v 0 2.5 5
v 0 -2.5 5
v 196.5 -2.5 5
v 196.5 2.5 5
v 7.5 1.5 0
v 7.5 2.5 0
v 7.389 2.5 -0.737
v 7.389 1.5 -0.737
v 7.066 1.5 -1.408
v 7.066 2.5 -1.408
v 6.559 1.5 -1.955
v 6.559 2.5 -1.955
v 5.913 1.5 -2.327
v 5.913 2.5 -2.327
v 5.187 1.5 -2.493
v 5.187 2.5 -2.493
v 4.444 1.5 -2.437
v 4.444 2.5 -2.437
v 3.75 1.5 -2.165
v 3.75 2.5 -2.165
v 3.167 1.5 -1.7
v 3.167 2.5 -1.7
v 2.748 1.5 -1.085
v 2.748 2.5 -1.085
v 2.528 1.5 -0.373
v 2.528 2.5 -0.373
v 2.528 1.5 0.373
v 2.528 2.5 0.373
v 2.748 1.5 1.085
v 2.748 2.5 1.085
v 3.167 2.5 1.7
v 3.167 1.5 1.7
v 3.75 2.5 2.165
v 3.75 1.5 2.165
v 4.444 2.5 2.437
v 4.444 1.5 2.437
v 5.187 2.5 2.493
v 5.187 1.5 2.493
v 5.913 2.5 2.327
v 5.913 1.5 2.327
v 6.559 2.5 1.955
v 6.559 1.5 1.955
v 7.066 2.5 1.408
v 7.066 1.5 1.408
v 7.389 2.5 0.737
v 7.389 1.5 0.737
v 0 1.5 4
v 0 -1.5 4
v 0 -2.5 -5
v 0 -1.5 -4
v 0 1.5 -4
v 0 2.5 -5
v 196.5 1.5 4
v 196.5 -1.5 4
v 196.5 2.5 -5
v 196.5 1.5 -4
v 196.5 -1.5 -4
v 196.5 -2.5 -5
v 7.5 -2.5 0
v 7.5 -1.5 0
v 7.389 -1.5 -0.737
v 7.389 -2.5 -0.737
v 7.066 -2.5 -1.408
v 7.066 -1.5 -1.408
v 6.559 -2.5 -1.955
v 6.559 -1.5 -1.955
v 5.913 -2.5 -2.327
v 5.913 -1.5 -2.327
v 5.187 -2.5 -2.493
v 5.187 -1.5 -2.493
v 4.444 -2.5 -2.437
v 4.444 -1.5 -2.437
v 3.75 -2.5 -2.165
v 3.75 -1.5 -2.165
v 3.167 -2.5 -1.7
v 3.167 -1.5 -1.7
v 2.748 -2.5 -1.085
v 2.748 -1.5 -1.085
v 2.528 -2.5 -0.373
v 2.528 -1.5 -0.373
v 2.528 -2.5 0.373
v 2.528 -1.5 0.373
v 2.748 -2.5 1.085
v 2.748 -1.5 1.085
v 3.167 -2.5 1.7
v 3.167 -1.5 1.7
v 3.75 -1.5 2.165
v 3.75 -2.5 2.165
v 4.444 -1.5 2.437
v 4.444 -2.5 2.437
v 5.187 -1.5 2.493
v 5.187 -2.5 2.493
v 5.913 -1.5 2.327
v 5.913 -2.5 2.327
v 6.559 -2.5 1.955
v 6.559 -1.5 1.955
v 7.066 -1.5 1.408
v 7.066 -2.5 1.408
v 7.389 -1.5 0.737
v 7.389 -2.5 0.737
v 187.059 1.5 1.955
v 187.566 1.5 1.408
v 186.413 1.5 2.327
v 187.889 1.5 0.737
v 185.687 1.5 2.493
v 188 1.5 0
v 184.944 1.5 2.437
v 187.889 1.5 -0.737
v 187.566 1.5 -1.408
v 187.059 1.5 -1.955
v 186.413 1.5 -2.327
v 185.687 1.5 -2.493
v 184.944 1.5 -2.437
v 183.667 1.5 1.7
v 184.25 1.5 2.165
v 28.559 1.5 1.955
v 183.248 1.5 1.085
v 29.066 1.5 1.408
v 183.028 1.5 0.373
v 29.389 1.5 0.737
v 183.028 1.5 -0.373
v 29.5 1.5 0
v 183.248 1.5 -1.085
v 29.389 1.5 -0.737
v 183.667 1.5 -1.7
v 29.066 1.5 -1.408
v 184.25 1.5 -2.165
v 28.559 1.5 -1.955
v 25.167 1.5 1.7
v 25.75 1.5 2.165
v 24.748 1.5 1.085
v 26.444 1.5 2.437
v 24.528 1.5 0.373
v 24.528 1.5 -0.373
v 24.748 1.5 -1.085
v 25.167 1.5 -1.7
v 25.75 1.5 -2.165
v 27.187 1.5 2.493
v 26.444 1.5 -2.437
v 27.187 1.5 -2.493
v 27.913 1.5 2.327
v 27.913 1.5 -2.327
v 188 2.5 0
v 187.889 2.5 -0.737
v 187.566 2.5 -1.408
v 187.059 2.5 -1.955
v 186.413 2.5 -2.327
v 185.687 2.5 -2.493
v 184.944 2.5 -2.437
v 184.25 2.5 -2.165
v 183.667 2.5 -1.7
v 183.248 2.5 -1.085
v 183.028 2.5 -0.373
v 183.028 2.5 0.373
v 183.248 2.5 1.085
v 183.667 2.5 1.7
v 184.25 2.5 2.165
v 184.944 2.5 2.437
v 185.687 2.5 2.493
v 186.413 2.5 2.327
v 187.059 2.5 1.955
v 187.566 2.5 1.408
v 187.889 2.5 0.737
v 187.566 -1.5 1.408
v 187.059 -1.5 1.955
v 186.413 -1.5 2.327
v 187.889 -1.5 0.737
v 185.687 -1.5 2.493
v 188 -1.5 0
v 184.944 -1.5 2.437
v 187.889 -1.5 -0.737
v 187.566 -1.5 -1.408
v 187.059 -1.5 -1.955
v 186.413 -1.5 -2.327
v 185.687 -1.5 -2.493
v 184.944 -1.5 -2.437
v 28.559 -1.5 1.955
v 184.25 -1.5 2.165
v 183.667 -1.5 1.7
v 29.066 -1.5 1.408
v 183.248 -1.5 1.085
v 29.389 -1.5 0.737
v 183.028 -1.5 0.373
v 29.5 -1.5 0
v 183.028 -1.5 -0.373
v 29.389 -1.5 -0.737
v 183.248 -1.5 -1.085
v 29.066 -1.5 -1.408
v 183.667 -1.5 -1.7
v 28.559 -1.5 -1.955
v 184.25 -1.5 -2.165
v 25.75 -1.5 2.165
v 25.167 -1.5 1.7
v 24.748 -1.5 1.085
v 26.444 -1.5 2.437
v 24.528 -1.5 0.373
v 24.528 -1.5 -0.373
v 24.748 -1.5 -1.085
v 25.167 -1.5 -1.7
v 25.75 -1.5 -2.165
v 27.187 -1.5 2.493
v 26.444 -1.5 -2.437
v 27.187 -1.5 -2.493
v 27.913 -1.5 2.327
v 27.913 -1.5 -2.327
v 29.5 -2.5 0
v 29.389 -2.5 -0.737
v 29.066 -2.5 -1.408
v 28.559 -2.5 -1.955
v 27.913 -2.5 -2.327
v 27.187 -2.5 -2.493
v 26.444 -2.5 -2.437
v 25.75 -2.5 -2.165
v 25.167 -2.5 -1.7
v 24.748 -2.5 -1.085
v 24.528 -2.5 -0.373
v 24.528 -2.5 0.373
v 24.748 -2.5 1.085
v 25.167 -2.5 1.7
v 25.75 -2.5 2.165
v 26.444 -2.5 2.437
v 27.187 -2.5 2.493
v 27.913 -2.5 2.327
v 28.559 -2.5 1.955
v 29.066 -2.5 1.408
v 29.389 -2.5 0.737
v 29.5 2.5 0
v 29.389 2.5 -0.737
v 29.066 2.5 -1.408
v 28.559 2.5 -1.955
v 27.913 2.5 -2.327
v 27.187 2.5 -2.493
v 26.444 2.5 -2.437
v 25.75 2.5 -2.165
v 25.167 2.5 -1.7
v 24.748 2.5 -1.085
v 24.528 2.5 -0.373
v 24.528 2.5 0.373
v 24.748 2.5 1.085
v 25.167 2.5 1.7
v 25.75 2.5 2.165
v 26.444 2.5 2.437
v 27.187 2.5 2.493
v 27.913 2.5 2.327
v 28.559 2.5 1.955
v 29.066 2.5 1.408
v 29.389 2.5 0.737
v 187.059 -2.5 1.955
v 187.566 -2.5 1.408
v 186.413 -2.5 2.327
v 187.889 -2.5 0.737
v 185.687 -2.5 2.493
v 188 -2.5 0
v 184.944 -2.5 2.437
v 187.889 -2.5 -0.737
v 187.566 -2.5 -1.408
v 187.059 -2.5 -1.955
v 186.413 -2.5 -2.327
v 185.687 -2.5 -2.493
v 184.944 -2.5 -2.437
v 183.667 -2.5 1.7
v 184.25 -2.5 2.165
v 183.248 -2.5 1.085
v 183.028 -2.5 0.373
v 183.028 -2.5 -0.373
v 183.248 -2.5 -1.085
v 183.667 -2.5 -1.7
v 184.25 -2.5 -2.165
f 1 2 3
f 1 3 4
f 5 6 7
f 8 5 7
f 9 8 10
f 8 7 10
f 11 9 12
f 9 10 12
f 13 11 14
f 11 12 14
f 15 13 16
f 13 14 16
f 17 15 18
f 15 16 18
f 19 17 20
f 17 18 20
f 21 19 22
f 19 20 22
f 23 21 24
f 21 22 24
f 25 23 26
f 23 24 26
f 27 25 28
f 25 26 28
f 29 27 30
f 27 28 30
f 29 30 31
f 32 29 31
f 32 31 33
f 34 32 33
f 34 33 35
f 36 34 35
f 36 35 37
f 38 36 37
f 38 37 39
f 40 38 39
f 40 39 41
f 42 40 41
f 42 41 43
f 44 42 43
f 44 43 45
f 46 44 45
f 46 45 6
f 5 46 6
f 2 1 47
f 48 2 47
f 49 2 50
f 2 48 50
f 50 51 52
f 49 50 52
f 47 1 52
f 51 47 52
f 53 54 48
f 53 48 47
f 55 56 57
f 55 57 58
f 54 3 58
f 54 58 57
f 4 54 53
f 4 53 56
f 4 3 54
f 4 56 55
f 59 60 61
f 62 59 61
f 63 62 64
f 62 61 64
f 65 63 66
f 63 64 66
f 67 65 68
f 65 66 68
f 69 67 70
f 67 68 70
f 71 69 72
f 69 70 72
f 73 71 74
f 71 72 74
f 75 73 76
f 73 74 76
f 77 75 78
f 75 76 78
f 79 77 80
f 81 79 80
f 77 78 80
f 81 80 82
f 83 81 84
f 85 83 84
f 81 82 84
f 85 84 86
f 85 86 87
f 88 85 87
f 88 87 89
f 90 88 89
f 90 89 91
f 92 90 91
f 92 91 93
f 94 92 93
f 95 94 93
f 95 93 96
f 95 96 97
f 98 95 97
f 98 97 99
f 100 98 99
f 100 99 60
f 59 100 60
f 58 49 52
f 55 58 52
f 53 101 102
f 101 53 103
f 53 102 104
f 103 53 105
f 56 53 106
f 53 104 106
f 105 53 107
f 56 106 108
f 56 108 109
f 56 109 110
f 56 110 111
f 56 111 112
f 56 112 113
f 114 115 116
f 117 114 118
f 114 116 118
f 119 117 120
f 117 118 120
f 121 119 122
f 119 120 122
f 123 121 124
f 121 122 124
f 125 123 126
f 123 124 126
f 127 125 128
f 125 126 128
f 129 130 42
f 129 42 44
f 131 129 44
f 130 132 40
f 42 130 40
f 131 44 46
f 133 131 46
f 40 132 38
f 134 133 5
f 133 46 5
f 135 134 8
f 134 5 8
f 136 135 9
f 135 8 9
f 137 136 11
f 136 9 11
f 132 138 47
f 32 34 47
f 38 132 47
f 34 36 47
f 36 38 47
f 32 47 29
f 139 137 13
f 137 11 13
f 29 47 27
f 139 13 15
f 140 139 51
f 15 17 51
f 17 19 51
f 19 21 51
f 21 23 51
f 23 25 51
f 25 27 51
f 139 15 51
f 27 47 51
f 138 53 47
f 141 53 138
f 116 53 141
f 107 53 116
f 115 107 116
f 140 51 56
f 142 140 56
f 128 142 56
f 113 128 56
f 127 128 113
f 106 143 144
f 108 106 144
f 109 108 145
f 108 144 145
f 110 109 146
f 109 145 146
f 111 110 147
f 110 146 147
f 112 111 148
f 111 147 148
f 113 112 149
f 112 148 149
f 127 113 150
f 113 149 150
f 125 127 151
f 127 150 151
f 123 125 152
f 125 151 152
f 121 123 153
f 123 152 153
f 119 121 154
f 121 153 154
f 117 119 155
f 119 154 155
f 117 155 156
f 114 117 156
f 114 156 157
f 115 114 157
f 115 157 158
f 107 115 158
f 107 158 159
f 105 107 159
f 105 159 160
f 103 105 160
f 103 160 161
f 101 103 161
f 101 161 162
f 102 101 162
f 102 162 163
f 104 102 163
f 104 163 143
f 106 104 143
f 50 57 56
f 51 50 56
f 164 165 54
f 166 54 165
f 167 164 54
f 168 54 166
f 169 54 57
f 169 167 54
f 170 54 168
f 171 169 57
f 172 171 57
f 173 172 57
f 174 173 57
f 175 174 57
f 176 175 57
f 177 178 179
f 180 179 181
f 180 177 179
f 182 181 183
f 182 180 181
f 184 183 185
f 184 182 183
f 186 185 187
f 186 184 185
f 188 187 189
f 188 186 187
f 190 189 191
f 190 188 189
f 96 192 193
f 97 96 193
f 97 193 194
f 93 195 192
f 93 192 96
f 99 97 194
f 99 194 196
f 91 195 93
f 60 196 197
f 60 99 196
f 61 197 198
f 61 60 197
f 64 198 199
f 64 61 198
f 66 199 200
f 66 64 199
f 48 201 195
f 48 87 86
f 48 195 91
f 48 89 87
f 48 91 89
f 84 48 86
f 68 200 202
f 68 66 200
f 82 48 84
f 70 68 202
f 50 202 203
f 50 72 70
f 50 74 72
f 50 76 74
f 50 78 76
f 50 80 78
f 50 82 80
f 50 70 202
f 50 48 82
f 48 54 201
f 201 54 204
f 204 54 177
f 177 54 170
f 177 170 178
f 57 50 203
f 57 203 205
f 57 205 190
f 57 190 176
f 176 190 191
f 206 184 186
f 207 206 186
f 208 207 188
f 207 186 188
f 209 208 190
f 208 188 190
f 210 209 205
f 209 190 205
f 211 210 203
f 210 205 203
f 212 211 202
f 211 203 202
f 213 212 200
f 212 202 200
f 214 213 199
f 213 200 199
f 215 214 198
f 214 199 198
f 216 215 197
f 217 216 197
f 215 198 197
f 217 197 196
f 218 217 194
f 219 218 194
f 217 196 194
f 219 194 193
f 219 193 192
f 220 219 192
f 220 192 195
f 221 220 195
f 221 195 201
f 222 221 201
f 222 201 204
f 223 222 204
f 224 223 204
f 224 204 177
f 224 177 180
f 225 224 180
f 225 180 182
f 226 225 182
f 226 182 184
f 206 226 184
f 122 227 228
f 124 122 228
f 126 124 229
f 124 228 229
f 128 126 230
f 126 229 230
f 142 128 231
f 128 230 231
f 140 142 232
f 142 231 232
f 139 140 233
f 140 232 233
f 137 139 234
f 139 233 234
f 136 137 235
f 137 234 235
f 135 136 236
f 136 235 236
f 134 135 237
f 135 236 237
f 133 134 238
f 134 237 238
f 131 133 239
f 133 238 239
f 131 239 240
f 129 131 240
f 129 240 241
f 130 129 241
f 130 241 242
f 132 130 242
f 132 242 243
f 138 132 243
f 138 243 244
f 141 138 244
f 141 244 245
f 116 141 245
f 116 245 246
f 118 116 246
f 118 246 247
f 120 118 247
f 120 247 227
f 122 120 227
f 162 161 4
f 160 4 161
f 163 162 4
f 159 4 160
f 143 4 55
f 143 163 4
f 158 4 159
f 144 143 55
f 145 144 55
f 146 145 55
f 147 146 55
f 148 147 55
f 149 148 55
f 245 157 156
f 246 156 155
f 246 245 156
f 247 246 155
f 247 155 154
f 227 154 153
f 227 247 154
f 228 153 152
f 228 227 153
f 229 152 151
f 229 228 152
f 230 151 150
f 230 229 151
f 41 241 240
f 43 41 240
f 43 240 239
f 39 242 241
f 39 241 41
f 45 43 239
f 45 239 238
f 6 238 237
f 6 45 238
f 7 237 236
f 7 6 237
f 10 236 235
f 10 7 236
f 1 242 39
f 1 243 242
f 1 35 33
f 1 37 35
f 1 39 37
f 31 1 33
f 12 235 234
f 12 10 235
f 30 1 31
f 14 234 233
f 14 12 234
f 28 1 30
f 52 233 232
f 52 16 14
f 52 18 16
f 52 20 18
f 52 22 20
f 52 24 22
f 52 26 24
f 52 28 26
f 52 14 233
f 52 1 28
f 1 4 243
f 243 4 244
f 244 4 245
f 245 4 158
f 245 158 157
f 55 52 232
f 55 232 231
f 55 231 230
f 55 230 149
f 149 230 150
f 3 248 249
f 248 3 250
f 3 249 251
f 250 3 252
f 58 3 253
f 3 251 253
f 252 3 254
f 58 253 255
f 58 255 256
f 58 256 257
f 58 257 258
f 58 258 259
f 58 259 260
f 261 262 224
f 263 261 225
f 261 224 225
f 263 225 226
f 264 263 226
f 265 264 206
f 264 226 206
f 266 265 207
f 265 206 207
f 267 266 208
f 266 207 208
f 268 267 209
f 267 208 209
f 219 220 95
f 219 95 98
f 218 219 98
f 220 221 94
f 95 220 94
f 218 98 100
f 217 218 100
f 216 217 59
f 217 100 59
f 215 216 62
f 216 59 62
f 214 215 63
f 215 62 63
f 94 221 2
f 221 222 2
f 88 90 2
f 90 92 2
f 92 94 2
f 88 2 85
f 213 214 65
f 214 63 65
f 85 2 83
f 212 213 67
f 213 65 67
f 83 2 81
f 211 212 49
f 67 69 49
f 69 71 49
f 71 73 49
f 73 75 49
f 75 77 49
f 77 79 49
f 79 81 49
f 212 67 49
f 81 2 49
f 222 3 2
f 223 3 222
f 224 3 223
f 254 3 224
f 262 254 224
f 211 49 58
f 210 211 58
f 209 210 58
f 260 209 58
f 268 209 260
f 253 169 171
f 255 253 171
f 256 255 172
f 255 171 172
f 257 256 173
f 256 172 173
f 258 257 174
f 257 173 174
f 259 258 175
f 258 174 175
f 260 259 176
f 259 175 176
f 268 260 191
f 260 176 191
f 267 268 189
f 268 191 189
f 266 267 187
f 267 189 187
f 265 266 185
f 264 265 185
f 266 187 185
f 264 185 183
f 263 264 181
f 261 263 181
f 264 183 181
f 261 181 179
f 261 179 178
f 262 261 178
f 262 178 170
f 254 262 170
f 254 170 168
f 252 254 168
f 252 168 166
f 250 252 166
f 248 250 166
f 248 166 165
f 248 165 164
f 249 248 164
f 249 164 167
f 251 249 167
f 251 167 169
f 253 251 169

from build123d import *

# Parameters (mm, degrees)
CROQUIS1_W              = 10
CROQUIS1_H              = 5
CROQUIS1_W_2            = 8
CROQUIS1_H_2            = 3
SALIENTE_EXTRUIR1_DEPTH = 393
CROQUIS2_R              = 2.5
CORTAR_EXTRUIR1_DEPTH   = 5
SKETCH1_W               = 196.5
SKETCH1_H               = 5
CUT_EXTRUDE1_DEPTH      = 10


with BuildPart() as part:
    # Croquis1 → Saliente-Extruir1 (new body)
    with BuildSketch(Plane(origin=(0, 0, 0), x_dir=(0, 0, -1), z_dir=(1, 0, 0))):
        Rectangle(CROQUIS1_W, CROQUIS1_H)
        Rectangle(CROQUIS1_W_2, CROQUIS1_H_2, mode=Mode.SUBTRACT)
    extrude(amount=SALIENTE_EXTRUIR1_DEPTH)

    # Croquis2 → Cortar-Extruir1 (cut)
    with BuildSketch(Plane(origin=(0, 2.5, 0), x_dir=(1, 0, 0), z_dir=(0, 1, 0))):
        with Locations((5, 0)):
            Circle(CROQUIS2_R)
        with Locations((388, 0)):
            Circle(CROQUIS2_R)
        with Locations((27, 0)):
            Circle(CROQUIS2_R)
        with Locations((366, 0)):
            Circle(CROQUIS2_R)
        with Locations((207.5, 0)):
            Circle(CROQUIS2_R)
        with Locations((185.5, 0)):
            Circle(CROQUIS2_R)
    extrude(amount=-CORTAR_EXTRUIR1_DEPTH, mode=Mode.SUBTRACT)

    # Sketch1 → Cut-Extrude1 (cut)
    with BuildSketch(Plane.XY.offset(5)):
        with Locations((294.75, 0)):
            Rectangle(SKETCH1_W, SKETCH1_H)
    extrude(amount=-CUT_EXTRUDE1_DEPTH, mode=Mode.SUBTRACT)


solid = part.part
